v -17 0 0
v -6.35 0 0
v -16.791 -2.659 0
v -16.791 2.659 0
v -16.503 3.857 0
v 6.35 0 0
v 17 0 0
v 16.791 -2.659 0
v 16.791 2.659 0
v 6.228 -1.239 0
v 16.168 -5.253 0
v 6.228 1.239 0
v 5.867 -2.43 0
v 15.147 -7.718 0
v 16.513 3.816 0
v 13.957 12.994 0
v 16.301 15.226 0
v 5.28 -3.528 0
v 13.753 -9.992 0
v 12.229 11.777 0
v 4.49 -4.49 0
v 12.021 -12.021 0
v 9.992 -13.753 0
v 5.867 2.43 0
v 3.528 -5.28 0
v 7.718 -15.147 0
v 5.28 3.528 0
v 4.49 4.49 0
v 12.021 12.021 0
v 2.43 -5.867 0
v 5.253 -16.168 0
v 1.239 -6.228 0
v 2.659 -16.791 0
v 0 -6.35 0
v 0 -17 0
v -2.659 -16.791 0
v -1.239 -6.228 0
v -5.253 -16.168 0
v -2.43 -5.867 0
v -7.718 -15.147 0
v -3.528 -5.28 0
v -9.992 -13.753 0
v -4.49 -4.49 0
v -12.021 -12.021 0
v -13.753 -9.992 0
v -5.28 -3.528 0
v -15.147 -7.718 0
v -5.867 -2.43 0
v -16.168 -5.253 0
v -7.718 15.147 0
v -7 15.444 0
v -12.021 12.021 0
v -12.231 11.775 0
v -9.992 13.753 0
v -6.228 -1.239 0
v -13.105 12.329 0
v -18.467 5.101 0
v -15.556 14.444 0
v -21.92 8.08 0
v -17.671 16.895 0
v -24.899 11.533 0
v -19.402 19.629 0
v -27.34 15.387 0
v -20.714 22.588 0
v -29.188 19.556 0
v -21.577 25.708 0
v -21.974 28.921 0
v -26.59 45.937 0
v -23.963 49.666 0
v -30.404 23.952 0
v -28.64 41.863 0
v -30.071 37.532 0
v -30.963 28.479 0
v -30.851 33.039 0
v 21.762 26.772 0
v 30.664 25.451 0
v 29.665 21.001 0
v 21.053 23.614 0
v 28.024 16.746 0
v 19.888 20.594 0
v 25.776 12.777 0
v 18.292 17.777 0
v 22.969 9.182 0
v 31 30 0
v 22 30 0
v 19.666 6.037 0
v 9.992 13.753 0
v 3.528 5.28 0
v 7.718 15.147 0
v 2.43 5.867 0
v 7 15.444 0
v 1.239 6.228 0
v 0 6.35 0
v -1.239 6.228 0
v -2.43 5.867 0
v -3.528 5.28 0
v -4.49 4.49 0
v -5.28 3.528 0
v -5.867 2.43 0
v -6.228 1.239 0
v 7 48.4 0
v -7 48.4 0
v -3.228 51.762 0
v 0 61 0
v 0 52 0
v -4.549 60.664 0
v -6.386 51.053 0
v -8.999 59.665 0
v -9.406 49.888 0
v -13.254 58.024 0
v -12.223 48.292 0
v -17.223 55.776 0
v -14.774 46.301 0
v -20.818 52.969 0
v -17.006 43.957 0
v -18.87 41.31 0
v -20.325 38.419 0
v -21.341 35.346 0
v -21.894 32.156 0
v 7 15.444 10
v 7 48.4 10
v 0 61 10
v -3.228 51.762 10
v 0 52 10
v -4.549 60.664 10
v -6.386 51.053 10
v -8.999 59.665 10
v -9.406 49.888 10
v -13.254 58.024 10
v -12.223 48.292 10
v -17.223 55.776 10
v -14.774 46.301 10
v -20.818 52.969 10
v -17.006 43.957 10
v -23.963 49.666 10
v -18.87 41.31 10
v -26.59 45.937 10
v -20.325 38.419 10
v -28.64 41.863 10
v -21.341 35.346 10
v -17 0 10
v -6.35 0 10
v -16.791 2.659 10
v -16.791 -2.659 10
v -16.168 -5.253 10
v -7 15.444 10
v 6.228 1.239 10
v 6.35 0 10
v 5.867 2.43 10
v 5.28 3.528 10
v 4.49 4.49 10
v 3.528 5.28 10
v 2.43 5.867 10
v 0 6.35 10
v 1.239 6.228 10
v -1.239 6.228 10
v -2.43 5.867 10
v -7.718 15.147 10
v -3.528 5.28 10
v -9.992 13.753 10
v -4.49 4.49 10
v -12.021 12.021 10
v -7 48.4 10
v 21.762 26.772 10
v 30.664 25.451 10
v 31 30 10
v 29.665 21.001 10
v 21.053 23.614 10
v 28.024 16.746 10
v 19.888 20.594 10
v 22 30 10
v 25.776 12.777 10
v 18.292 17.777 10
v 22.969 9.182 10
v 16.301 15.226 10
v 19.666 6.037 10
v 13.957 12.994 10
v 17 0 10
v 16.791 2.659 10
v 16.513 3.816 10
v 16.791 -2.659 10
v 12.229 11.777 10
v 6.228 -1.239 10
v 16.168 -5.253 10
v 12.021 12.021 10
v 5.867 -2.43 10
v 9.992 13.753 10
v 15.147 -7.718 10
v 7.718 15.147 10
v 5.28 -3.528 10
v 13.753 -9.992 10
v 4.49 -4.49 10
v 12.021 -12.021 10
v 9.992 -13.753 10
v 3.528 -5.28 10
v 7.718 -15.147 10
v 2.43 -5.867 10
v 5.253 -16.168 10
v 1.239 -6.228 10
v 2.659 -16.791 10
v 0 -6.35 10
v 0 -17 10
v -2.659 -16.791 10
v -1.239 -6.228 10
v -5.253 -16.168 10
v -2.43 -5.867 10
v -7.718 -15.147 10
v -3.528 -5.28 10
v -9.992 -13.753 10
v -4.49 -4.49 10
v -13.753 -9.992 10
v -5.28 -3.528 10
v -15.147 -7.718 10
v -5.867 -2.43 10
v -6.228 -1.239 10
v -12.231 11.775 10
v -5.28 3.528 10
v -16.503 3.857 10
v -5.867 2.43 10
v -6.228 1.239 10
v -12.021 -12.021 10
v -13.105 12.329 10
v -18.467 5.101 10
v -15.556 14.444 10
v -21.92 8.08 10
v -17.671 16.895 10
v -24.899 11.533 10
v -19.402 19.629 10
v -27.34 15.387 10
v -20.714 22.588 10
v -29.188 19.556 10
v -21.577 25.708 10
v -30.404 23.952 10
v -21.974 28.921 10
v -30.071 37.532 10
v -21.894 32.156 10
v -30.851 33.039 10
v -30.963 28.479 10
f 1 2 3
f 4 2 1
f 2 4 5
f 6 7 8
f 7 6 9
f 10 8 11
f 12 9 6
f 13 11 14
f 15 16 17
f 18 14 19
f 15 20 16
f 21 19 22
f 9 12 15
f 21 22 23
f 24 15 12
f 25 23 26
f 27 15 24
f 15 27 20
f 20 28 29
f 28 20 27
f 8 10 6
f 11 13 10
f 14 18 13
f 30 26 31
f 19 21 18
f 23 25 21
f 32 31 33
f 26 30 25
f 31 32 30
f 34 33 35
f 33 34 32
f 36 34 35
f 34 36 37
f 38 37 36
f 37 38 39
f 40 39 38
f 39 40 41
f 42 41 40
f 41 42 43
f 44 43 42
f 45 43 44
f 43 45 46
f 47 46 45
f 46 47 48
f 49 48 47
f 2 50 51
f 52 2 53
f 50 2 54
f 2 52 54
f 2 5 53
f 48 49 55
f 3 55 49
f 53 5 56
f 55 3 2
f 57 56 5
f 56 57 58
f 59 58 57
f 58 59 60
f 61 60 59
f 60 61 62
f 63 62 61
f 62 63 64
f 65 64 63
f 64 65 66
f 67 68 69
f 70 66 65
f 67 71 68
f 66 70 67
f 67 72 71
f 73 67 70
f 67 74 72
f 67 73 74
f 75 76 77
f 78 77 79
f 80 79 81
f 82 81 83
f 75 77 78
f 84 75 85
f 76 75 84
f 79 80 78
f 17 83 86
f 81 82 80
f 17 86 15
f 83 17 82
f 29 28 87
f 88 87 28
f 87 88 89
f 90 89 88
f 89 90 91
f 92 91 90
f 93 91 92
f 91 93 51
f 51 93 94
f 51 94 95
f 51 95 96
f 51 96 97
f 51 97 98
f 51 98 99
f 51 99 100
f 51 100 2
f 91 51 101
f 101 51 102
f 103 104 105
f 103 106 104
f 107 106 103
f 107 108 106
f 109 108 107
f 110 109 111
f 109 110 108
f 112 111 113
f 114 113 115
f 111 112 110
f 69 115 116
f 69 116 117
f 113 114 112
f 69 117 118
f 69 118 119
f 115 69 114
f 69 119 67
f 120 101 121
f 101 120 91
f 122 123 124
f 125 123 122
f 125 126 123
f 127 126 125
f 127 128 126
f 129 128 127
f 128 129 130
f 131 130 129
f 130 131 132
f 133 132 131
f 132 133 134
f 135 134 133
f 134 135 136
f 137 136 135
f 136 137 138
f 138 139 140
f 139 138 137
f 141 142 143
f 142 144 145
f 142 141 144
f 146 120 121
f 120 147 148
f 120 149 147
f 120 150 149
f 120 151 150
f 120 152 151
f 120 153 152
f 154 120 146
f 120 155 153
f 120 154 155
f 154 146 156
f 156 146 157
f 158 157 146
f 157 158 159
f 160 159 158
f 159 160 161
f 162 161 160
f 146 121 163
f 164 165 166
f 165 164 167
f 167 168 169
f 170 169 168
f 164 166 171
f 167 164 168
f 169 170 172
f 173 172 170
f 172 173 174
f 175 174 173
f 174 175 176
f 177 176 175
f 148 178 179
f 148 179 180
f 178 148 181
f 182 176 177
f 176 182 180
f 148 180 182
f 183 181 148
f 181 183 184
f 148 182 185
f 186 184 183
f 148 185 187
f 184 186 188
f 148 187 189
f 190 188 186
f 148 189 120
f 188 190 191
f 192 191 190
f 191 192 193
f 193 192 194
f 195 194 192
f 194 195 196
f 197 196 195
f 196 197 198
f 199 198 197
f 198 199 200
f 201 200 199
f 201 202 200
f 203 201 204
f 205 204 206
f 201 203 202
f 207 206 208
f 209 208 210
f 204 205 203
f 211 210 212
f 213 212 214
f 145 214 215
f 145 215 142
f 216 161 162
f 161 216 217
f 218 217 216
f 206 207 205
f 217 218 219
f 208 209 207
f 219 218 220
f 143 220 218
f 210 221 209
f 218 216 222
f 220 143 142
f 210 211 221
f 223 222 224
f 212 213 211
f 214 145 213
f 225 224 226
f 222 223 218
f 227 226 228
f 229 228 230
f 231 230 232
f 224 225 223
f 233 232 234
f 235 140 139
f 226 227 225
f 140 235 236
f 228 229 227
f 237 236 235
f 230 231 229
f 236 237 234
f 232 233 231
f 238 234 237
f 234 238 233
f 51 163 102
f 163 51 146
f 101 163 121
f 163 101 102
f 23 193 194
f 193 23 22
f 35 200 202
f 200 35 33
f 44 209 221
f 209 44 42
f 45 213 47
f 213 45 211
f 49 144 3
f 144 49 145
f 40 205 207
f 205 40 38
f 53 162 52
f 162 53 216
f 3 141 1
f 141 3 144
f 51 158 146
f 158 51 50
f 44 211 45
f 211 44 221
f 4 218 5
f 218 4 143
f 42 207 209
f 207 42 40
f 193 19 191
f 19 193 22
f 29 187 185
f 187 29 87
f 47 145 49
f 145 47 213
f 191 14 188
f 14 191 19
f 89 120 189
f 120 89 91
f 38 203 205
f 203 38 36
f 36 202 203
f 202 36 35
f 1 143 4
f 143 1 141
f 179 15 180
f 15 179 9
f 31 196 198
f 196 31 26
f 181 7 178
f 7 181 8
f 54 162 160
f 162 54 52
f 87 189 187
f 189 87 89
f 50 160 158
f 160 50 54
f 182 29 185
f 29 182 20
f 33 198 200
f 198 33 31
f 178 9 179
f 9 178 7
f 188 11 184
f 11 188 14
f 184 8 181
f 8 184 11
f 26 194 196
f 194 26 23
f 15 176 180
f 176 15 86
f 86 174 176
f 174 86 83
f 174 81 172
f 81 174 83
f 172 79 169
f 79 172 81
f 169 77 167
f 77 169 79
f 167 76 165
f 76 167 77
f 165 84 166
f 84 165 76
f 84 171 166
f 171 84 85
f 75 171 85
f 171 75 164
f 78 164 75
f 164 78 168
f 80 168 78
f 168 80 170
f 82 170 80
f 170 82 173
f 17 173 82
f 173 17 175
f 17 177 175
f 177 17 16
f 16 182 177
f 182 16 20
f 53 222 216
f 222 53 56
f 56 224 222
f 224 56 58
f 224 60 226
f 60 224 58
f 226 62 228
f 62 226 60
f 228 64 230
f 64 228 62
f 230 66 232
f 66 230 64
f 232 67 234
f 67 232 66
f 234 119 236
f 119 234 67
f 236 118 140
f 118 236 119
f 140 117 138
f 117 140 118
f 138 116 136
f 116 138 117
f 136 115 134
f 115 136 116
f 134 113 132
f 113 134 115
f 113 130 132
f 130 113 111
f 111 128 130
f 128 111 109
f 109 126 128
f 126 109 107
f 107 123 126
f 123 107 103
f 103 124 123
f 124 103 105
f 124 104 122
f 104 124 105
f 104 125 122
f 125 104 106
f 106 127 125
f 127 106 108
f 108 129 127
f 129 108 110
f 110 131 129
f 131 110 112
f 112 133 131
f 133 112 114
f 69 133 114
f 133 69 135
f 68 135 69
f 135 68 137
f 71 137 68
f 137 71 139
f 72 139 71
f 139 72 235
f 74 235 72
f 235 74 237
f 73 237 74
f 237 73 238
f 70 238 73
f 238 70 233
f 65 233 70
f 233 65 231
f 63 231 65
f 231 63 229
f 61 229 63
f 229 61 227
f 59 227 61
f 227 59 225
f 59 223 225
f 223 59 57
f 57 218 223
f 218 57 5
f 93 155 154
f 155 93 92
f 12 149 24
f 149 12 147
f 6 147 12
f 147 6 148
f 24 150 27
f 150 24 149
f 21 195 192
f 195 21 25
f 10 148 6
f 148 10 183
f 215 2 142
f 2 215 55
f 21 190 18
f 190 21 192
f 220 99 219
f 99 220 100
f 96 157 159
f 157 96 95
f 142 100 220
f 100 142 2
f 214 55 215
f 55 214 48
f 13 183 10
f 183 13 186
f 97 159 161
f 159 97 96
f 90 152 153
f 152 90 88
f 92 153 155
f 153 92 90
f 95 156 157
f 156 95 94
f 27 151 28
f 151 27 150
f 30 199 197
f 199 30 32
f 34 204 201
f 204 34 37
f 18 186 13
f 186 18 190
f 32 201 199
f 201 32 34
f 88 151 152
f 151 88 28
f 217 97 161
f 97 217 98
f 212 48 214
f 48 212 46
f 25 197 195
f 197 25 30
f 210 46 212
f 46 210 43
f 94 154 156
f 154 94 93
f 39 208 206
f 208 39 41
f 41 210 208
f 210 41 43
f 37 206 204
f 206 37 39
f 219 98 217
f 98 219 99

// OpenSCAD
$fn = 32;

// ----------------------------------------------------------------------
// Hook: 60 mm shank into a 22 mm curl, 10 mm thick
// ----------------------------------------------------------------------

// --- parameters (mm) ---
shank_len = 60;           // shank length from the boss centre
shank_w = 14;             // shank width
boss_d = 34;              // boss diameter
bore_d = 12.7;            // boss bore
curl_in = 22;             // curl inner radius
curl_out = 31;            // curl outer radius
curl_sweep = 270;         // curl sweep angle
hook_t = 10;              // hook thickness

shank_profile = [[-7, 48.4], [7, 48.4], [7, 15], [-7, 15]];
boss_profile = [[17, 0], [16.791, 2.659], [16.168, 5.253], [15.147, 7.718], [13.753, 9.992], [12.021, 12.021], [9.992, 13.753], [7.718, 15.147], [5.253, 16.168], [2.659, 16.791], [0, 17], [-2.659, 16.791], [-5.253, 16.168], [-7.718, 15.147], [-9.992, 13.753], [-12.021, 12.021], [-13.753, 9.992], [-15.147, 7.718], [-16.168, 5.253], [-16.791, 2.659], [-17, 0], [-16.791, -2.659], [-16.168, -5.253], [-15.147, -7.718], [-13.753, -9.992], [-12.021, -12.021], [-9.992, -13.753], [-7.718, -15.147], [-5.253, -16.168], [-2.659, -16.791], [0, -17], [2.659, -16.791], [5.253, -16.168], [7.718, -15.147], [9.992, -13.753], [12.021, -12.021], [13.753, -9.992], [15.147, -7.718], [16.168, -5.253], [16.791, -2.659]];
curl_profile = [[0, 61], [-4.549, 60.664], [-8.999, 59.665], [-13.254, 58.024], [-17.223, 55.776], [-20.818, 52.969], [-23.963, 49.666], [-26.59, 45.937], [-28.64, 41.863], [-30.071, 37.532], [-30.851, 33.039], [-30.963, 28.479], [-30.404, 23.952], [-29.188, 19.556], [-27.34, 15.387], [-24.899, 11.533], [-21.92, 8.08], [-18.467, 5.101], [-14.613, 2.66], [-10.444, 0.812], [-6.048, -0.404], [-1.521, -0.963], [3.039, -0.851], [7.532, -0.071], [11.863, 1.36], [15.937, 3.41], [19.666, 6.037], [22.969, 9.182], [25.776, 12.777], [28.024, 16.746], [29.665, 21.001], [30.664, 25.451], [31, 30], [22, 30], [21.762, 26.772], [21.053, 23.614], [19.888, 20.594], [18.292, 17.777], [16.301, 15.226], [13.957, 12.994], [11.31, 11.13], [8.419, 9.675], [5.346, 8.659], [2.156, 8.106], [-1.079, 8.026], [-4.292, 8.423], [-7.412, 9.286], [-10.371, 10.598], [-13.105, 12.329], [-15.556, 14.444], [-17.671, 16.895], [-19.402, 19.629], [-20.714, 22.588], [-21.577, 25.708], [-21.974, 28.921], [-21.894, 32.156], [-21.341, 35.346], [-20.325, 38.419], [-18.87, 41.31], [-17.006, 43.957], [-14.774, 46.301], [-12.223, 48.292], [-9.406, 49.888], [-6.386, 51.053], [-3.228, 51.762], [0, 52]];

difference() {
  union() {
    /* three overlapping outlines: shank, boss and the smooth curl */
    linear_extrude(height = hook_t) polygon(shank_profile);
    linear_extrude(height = hook_t) polygon(boss_profile);
    linear_extrude(height = hook_t) polygon(curl_profile);
  }
  translate([0, 0, -2.5]) cylinder(h = hook_t + 5, d = bore_d);
}
